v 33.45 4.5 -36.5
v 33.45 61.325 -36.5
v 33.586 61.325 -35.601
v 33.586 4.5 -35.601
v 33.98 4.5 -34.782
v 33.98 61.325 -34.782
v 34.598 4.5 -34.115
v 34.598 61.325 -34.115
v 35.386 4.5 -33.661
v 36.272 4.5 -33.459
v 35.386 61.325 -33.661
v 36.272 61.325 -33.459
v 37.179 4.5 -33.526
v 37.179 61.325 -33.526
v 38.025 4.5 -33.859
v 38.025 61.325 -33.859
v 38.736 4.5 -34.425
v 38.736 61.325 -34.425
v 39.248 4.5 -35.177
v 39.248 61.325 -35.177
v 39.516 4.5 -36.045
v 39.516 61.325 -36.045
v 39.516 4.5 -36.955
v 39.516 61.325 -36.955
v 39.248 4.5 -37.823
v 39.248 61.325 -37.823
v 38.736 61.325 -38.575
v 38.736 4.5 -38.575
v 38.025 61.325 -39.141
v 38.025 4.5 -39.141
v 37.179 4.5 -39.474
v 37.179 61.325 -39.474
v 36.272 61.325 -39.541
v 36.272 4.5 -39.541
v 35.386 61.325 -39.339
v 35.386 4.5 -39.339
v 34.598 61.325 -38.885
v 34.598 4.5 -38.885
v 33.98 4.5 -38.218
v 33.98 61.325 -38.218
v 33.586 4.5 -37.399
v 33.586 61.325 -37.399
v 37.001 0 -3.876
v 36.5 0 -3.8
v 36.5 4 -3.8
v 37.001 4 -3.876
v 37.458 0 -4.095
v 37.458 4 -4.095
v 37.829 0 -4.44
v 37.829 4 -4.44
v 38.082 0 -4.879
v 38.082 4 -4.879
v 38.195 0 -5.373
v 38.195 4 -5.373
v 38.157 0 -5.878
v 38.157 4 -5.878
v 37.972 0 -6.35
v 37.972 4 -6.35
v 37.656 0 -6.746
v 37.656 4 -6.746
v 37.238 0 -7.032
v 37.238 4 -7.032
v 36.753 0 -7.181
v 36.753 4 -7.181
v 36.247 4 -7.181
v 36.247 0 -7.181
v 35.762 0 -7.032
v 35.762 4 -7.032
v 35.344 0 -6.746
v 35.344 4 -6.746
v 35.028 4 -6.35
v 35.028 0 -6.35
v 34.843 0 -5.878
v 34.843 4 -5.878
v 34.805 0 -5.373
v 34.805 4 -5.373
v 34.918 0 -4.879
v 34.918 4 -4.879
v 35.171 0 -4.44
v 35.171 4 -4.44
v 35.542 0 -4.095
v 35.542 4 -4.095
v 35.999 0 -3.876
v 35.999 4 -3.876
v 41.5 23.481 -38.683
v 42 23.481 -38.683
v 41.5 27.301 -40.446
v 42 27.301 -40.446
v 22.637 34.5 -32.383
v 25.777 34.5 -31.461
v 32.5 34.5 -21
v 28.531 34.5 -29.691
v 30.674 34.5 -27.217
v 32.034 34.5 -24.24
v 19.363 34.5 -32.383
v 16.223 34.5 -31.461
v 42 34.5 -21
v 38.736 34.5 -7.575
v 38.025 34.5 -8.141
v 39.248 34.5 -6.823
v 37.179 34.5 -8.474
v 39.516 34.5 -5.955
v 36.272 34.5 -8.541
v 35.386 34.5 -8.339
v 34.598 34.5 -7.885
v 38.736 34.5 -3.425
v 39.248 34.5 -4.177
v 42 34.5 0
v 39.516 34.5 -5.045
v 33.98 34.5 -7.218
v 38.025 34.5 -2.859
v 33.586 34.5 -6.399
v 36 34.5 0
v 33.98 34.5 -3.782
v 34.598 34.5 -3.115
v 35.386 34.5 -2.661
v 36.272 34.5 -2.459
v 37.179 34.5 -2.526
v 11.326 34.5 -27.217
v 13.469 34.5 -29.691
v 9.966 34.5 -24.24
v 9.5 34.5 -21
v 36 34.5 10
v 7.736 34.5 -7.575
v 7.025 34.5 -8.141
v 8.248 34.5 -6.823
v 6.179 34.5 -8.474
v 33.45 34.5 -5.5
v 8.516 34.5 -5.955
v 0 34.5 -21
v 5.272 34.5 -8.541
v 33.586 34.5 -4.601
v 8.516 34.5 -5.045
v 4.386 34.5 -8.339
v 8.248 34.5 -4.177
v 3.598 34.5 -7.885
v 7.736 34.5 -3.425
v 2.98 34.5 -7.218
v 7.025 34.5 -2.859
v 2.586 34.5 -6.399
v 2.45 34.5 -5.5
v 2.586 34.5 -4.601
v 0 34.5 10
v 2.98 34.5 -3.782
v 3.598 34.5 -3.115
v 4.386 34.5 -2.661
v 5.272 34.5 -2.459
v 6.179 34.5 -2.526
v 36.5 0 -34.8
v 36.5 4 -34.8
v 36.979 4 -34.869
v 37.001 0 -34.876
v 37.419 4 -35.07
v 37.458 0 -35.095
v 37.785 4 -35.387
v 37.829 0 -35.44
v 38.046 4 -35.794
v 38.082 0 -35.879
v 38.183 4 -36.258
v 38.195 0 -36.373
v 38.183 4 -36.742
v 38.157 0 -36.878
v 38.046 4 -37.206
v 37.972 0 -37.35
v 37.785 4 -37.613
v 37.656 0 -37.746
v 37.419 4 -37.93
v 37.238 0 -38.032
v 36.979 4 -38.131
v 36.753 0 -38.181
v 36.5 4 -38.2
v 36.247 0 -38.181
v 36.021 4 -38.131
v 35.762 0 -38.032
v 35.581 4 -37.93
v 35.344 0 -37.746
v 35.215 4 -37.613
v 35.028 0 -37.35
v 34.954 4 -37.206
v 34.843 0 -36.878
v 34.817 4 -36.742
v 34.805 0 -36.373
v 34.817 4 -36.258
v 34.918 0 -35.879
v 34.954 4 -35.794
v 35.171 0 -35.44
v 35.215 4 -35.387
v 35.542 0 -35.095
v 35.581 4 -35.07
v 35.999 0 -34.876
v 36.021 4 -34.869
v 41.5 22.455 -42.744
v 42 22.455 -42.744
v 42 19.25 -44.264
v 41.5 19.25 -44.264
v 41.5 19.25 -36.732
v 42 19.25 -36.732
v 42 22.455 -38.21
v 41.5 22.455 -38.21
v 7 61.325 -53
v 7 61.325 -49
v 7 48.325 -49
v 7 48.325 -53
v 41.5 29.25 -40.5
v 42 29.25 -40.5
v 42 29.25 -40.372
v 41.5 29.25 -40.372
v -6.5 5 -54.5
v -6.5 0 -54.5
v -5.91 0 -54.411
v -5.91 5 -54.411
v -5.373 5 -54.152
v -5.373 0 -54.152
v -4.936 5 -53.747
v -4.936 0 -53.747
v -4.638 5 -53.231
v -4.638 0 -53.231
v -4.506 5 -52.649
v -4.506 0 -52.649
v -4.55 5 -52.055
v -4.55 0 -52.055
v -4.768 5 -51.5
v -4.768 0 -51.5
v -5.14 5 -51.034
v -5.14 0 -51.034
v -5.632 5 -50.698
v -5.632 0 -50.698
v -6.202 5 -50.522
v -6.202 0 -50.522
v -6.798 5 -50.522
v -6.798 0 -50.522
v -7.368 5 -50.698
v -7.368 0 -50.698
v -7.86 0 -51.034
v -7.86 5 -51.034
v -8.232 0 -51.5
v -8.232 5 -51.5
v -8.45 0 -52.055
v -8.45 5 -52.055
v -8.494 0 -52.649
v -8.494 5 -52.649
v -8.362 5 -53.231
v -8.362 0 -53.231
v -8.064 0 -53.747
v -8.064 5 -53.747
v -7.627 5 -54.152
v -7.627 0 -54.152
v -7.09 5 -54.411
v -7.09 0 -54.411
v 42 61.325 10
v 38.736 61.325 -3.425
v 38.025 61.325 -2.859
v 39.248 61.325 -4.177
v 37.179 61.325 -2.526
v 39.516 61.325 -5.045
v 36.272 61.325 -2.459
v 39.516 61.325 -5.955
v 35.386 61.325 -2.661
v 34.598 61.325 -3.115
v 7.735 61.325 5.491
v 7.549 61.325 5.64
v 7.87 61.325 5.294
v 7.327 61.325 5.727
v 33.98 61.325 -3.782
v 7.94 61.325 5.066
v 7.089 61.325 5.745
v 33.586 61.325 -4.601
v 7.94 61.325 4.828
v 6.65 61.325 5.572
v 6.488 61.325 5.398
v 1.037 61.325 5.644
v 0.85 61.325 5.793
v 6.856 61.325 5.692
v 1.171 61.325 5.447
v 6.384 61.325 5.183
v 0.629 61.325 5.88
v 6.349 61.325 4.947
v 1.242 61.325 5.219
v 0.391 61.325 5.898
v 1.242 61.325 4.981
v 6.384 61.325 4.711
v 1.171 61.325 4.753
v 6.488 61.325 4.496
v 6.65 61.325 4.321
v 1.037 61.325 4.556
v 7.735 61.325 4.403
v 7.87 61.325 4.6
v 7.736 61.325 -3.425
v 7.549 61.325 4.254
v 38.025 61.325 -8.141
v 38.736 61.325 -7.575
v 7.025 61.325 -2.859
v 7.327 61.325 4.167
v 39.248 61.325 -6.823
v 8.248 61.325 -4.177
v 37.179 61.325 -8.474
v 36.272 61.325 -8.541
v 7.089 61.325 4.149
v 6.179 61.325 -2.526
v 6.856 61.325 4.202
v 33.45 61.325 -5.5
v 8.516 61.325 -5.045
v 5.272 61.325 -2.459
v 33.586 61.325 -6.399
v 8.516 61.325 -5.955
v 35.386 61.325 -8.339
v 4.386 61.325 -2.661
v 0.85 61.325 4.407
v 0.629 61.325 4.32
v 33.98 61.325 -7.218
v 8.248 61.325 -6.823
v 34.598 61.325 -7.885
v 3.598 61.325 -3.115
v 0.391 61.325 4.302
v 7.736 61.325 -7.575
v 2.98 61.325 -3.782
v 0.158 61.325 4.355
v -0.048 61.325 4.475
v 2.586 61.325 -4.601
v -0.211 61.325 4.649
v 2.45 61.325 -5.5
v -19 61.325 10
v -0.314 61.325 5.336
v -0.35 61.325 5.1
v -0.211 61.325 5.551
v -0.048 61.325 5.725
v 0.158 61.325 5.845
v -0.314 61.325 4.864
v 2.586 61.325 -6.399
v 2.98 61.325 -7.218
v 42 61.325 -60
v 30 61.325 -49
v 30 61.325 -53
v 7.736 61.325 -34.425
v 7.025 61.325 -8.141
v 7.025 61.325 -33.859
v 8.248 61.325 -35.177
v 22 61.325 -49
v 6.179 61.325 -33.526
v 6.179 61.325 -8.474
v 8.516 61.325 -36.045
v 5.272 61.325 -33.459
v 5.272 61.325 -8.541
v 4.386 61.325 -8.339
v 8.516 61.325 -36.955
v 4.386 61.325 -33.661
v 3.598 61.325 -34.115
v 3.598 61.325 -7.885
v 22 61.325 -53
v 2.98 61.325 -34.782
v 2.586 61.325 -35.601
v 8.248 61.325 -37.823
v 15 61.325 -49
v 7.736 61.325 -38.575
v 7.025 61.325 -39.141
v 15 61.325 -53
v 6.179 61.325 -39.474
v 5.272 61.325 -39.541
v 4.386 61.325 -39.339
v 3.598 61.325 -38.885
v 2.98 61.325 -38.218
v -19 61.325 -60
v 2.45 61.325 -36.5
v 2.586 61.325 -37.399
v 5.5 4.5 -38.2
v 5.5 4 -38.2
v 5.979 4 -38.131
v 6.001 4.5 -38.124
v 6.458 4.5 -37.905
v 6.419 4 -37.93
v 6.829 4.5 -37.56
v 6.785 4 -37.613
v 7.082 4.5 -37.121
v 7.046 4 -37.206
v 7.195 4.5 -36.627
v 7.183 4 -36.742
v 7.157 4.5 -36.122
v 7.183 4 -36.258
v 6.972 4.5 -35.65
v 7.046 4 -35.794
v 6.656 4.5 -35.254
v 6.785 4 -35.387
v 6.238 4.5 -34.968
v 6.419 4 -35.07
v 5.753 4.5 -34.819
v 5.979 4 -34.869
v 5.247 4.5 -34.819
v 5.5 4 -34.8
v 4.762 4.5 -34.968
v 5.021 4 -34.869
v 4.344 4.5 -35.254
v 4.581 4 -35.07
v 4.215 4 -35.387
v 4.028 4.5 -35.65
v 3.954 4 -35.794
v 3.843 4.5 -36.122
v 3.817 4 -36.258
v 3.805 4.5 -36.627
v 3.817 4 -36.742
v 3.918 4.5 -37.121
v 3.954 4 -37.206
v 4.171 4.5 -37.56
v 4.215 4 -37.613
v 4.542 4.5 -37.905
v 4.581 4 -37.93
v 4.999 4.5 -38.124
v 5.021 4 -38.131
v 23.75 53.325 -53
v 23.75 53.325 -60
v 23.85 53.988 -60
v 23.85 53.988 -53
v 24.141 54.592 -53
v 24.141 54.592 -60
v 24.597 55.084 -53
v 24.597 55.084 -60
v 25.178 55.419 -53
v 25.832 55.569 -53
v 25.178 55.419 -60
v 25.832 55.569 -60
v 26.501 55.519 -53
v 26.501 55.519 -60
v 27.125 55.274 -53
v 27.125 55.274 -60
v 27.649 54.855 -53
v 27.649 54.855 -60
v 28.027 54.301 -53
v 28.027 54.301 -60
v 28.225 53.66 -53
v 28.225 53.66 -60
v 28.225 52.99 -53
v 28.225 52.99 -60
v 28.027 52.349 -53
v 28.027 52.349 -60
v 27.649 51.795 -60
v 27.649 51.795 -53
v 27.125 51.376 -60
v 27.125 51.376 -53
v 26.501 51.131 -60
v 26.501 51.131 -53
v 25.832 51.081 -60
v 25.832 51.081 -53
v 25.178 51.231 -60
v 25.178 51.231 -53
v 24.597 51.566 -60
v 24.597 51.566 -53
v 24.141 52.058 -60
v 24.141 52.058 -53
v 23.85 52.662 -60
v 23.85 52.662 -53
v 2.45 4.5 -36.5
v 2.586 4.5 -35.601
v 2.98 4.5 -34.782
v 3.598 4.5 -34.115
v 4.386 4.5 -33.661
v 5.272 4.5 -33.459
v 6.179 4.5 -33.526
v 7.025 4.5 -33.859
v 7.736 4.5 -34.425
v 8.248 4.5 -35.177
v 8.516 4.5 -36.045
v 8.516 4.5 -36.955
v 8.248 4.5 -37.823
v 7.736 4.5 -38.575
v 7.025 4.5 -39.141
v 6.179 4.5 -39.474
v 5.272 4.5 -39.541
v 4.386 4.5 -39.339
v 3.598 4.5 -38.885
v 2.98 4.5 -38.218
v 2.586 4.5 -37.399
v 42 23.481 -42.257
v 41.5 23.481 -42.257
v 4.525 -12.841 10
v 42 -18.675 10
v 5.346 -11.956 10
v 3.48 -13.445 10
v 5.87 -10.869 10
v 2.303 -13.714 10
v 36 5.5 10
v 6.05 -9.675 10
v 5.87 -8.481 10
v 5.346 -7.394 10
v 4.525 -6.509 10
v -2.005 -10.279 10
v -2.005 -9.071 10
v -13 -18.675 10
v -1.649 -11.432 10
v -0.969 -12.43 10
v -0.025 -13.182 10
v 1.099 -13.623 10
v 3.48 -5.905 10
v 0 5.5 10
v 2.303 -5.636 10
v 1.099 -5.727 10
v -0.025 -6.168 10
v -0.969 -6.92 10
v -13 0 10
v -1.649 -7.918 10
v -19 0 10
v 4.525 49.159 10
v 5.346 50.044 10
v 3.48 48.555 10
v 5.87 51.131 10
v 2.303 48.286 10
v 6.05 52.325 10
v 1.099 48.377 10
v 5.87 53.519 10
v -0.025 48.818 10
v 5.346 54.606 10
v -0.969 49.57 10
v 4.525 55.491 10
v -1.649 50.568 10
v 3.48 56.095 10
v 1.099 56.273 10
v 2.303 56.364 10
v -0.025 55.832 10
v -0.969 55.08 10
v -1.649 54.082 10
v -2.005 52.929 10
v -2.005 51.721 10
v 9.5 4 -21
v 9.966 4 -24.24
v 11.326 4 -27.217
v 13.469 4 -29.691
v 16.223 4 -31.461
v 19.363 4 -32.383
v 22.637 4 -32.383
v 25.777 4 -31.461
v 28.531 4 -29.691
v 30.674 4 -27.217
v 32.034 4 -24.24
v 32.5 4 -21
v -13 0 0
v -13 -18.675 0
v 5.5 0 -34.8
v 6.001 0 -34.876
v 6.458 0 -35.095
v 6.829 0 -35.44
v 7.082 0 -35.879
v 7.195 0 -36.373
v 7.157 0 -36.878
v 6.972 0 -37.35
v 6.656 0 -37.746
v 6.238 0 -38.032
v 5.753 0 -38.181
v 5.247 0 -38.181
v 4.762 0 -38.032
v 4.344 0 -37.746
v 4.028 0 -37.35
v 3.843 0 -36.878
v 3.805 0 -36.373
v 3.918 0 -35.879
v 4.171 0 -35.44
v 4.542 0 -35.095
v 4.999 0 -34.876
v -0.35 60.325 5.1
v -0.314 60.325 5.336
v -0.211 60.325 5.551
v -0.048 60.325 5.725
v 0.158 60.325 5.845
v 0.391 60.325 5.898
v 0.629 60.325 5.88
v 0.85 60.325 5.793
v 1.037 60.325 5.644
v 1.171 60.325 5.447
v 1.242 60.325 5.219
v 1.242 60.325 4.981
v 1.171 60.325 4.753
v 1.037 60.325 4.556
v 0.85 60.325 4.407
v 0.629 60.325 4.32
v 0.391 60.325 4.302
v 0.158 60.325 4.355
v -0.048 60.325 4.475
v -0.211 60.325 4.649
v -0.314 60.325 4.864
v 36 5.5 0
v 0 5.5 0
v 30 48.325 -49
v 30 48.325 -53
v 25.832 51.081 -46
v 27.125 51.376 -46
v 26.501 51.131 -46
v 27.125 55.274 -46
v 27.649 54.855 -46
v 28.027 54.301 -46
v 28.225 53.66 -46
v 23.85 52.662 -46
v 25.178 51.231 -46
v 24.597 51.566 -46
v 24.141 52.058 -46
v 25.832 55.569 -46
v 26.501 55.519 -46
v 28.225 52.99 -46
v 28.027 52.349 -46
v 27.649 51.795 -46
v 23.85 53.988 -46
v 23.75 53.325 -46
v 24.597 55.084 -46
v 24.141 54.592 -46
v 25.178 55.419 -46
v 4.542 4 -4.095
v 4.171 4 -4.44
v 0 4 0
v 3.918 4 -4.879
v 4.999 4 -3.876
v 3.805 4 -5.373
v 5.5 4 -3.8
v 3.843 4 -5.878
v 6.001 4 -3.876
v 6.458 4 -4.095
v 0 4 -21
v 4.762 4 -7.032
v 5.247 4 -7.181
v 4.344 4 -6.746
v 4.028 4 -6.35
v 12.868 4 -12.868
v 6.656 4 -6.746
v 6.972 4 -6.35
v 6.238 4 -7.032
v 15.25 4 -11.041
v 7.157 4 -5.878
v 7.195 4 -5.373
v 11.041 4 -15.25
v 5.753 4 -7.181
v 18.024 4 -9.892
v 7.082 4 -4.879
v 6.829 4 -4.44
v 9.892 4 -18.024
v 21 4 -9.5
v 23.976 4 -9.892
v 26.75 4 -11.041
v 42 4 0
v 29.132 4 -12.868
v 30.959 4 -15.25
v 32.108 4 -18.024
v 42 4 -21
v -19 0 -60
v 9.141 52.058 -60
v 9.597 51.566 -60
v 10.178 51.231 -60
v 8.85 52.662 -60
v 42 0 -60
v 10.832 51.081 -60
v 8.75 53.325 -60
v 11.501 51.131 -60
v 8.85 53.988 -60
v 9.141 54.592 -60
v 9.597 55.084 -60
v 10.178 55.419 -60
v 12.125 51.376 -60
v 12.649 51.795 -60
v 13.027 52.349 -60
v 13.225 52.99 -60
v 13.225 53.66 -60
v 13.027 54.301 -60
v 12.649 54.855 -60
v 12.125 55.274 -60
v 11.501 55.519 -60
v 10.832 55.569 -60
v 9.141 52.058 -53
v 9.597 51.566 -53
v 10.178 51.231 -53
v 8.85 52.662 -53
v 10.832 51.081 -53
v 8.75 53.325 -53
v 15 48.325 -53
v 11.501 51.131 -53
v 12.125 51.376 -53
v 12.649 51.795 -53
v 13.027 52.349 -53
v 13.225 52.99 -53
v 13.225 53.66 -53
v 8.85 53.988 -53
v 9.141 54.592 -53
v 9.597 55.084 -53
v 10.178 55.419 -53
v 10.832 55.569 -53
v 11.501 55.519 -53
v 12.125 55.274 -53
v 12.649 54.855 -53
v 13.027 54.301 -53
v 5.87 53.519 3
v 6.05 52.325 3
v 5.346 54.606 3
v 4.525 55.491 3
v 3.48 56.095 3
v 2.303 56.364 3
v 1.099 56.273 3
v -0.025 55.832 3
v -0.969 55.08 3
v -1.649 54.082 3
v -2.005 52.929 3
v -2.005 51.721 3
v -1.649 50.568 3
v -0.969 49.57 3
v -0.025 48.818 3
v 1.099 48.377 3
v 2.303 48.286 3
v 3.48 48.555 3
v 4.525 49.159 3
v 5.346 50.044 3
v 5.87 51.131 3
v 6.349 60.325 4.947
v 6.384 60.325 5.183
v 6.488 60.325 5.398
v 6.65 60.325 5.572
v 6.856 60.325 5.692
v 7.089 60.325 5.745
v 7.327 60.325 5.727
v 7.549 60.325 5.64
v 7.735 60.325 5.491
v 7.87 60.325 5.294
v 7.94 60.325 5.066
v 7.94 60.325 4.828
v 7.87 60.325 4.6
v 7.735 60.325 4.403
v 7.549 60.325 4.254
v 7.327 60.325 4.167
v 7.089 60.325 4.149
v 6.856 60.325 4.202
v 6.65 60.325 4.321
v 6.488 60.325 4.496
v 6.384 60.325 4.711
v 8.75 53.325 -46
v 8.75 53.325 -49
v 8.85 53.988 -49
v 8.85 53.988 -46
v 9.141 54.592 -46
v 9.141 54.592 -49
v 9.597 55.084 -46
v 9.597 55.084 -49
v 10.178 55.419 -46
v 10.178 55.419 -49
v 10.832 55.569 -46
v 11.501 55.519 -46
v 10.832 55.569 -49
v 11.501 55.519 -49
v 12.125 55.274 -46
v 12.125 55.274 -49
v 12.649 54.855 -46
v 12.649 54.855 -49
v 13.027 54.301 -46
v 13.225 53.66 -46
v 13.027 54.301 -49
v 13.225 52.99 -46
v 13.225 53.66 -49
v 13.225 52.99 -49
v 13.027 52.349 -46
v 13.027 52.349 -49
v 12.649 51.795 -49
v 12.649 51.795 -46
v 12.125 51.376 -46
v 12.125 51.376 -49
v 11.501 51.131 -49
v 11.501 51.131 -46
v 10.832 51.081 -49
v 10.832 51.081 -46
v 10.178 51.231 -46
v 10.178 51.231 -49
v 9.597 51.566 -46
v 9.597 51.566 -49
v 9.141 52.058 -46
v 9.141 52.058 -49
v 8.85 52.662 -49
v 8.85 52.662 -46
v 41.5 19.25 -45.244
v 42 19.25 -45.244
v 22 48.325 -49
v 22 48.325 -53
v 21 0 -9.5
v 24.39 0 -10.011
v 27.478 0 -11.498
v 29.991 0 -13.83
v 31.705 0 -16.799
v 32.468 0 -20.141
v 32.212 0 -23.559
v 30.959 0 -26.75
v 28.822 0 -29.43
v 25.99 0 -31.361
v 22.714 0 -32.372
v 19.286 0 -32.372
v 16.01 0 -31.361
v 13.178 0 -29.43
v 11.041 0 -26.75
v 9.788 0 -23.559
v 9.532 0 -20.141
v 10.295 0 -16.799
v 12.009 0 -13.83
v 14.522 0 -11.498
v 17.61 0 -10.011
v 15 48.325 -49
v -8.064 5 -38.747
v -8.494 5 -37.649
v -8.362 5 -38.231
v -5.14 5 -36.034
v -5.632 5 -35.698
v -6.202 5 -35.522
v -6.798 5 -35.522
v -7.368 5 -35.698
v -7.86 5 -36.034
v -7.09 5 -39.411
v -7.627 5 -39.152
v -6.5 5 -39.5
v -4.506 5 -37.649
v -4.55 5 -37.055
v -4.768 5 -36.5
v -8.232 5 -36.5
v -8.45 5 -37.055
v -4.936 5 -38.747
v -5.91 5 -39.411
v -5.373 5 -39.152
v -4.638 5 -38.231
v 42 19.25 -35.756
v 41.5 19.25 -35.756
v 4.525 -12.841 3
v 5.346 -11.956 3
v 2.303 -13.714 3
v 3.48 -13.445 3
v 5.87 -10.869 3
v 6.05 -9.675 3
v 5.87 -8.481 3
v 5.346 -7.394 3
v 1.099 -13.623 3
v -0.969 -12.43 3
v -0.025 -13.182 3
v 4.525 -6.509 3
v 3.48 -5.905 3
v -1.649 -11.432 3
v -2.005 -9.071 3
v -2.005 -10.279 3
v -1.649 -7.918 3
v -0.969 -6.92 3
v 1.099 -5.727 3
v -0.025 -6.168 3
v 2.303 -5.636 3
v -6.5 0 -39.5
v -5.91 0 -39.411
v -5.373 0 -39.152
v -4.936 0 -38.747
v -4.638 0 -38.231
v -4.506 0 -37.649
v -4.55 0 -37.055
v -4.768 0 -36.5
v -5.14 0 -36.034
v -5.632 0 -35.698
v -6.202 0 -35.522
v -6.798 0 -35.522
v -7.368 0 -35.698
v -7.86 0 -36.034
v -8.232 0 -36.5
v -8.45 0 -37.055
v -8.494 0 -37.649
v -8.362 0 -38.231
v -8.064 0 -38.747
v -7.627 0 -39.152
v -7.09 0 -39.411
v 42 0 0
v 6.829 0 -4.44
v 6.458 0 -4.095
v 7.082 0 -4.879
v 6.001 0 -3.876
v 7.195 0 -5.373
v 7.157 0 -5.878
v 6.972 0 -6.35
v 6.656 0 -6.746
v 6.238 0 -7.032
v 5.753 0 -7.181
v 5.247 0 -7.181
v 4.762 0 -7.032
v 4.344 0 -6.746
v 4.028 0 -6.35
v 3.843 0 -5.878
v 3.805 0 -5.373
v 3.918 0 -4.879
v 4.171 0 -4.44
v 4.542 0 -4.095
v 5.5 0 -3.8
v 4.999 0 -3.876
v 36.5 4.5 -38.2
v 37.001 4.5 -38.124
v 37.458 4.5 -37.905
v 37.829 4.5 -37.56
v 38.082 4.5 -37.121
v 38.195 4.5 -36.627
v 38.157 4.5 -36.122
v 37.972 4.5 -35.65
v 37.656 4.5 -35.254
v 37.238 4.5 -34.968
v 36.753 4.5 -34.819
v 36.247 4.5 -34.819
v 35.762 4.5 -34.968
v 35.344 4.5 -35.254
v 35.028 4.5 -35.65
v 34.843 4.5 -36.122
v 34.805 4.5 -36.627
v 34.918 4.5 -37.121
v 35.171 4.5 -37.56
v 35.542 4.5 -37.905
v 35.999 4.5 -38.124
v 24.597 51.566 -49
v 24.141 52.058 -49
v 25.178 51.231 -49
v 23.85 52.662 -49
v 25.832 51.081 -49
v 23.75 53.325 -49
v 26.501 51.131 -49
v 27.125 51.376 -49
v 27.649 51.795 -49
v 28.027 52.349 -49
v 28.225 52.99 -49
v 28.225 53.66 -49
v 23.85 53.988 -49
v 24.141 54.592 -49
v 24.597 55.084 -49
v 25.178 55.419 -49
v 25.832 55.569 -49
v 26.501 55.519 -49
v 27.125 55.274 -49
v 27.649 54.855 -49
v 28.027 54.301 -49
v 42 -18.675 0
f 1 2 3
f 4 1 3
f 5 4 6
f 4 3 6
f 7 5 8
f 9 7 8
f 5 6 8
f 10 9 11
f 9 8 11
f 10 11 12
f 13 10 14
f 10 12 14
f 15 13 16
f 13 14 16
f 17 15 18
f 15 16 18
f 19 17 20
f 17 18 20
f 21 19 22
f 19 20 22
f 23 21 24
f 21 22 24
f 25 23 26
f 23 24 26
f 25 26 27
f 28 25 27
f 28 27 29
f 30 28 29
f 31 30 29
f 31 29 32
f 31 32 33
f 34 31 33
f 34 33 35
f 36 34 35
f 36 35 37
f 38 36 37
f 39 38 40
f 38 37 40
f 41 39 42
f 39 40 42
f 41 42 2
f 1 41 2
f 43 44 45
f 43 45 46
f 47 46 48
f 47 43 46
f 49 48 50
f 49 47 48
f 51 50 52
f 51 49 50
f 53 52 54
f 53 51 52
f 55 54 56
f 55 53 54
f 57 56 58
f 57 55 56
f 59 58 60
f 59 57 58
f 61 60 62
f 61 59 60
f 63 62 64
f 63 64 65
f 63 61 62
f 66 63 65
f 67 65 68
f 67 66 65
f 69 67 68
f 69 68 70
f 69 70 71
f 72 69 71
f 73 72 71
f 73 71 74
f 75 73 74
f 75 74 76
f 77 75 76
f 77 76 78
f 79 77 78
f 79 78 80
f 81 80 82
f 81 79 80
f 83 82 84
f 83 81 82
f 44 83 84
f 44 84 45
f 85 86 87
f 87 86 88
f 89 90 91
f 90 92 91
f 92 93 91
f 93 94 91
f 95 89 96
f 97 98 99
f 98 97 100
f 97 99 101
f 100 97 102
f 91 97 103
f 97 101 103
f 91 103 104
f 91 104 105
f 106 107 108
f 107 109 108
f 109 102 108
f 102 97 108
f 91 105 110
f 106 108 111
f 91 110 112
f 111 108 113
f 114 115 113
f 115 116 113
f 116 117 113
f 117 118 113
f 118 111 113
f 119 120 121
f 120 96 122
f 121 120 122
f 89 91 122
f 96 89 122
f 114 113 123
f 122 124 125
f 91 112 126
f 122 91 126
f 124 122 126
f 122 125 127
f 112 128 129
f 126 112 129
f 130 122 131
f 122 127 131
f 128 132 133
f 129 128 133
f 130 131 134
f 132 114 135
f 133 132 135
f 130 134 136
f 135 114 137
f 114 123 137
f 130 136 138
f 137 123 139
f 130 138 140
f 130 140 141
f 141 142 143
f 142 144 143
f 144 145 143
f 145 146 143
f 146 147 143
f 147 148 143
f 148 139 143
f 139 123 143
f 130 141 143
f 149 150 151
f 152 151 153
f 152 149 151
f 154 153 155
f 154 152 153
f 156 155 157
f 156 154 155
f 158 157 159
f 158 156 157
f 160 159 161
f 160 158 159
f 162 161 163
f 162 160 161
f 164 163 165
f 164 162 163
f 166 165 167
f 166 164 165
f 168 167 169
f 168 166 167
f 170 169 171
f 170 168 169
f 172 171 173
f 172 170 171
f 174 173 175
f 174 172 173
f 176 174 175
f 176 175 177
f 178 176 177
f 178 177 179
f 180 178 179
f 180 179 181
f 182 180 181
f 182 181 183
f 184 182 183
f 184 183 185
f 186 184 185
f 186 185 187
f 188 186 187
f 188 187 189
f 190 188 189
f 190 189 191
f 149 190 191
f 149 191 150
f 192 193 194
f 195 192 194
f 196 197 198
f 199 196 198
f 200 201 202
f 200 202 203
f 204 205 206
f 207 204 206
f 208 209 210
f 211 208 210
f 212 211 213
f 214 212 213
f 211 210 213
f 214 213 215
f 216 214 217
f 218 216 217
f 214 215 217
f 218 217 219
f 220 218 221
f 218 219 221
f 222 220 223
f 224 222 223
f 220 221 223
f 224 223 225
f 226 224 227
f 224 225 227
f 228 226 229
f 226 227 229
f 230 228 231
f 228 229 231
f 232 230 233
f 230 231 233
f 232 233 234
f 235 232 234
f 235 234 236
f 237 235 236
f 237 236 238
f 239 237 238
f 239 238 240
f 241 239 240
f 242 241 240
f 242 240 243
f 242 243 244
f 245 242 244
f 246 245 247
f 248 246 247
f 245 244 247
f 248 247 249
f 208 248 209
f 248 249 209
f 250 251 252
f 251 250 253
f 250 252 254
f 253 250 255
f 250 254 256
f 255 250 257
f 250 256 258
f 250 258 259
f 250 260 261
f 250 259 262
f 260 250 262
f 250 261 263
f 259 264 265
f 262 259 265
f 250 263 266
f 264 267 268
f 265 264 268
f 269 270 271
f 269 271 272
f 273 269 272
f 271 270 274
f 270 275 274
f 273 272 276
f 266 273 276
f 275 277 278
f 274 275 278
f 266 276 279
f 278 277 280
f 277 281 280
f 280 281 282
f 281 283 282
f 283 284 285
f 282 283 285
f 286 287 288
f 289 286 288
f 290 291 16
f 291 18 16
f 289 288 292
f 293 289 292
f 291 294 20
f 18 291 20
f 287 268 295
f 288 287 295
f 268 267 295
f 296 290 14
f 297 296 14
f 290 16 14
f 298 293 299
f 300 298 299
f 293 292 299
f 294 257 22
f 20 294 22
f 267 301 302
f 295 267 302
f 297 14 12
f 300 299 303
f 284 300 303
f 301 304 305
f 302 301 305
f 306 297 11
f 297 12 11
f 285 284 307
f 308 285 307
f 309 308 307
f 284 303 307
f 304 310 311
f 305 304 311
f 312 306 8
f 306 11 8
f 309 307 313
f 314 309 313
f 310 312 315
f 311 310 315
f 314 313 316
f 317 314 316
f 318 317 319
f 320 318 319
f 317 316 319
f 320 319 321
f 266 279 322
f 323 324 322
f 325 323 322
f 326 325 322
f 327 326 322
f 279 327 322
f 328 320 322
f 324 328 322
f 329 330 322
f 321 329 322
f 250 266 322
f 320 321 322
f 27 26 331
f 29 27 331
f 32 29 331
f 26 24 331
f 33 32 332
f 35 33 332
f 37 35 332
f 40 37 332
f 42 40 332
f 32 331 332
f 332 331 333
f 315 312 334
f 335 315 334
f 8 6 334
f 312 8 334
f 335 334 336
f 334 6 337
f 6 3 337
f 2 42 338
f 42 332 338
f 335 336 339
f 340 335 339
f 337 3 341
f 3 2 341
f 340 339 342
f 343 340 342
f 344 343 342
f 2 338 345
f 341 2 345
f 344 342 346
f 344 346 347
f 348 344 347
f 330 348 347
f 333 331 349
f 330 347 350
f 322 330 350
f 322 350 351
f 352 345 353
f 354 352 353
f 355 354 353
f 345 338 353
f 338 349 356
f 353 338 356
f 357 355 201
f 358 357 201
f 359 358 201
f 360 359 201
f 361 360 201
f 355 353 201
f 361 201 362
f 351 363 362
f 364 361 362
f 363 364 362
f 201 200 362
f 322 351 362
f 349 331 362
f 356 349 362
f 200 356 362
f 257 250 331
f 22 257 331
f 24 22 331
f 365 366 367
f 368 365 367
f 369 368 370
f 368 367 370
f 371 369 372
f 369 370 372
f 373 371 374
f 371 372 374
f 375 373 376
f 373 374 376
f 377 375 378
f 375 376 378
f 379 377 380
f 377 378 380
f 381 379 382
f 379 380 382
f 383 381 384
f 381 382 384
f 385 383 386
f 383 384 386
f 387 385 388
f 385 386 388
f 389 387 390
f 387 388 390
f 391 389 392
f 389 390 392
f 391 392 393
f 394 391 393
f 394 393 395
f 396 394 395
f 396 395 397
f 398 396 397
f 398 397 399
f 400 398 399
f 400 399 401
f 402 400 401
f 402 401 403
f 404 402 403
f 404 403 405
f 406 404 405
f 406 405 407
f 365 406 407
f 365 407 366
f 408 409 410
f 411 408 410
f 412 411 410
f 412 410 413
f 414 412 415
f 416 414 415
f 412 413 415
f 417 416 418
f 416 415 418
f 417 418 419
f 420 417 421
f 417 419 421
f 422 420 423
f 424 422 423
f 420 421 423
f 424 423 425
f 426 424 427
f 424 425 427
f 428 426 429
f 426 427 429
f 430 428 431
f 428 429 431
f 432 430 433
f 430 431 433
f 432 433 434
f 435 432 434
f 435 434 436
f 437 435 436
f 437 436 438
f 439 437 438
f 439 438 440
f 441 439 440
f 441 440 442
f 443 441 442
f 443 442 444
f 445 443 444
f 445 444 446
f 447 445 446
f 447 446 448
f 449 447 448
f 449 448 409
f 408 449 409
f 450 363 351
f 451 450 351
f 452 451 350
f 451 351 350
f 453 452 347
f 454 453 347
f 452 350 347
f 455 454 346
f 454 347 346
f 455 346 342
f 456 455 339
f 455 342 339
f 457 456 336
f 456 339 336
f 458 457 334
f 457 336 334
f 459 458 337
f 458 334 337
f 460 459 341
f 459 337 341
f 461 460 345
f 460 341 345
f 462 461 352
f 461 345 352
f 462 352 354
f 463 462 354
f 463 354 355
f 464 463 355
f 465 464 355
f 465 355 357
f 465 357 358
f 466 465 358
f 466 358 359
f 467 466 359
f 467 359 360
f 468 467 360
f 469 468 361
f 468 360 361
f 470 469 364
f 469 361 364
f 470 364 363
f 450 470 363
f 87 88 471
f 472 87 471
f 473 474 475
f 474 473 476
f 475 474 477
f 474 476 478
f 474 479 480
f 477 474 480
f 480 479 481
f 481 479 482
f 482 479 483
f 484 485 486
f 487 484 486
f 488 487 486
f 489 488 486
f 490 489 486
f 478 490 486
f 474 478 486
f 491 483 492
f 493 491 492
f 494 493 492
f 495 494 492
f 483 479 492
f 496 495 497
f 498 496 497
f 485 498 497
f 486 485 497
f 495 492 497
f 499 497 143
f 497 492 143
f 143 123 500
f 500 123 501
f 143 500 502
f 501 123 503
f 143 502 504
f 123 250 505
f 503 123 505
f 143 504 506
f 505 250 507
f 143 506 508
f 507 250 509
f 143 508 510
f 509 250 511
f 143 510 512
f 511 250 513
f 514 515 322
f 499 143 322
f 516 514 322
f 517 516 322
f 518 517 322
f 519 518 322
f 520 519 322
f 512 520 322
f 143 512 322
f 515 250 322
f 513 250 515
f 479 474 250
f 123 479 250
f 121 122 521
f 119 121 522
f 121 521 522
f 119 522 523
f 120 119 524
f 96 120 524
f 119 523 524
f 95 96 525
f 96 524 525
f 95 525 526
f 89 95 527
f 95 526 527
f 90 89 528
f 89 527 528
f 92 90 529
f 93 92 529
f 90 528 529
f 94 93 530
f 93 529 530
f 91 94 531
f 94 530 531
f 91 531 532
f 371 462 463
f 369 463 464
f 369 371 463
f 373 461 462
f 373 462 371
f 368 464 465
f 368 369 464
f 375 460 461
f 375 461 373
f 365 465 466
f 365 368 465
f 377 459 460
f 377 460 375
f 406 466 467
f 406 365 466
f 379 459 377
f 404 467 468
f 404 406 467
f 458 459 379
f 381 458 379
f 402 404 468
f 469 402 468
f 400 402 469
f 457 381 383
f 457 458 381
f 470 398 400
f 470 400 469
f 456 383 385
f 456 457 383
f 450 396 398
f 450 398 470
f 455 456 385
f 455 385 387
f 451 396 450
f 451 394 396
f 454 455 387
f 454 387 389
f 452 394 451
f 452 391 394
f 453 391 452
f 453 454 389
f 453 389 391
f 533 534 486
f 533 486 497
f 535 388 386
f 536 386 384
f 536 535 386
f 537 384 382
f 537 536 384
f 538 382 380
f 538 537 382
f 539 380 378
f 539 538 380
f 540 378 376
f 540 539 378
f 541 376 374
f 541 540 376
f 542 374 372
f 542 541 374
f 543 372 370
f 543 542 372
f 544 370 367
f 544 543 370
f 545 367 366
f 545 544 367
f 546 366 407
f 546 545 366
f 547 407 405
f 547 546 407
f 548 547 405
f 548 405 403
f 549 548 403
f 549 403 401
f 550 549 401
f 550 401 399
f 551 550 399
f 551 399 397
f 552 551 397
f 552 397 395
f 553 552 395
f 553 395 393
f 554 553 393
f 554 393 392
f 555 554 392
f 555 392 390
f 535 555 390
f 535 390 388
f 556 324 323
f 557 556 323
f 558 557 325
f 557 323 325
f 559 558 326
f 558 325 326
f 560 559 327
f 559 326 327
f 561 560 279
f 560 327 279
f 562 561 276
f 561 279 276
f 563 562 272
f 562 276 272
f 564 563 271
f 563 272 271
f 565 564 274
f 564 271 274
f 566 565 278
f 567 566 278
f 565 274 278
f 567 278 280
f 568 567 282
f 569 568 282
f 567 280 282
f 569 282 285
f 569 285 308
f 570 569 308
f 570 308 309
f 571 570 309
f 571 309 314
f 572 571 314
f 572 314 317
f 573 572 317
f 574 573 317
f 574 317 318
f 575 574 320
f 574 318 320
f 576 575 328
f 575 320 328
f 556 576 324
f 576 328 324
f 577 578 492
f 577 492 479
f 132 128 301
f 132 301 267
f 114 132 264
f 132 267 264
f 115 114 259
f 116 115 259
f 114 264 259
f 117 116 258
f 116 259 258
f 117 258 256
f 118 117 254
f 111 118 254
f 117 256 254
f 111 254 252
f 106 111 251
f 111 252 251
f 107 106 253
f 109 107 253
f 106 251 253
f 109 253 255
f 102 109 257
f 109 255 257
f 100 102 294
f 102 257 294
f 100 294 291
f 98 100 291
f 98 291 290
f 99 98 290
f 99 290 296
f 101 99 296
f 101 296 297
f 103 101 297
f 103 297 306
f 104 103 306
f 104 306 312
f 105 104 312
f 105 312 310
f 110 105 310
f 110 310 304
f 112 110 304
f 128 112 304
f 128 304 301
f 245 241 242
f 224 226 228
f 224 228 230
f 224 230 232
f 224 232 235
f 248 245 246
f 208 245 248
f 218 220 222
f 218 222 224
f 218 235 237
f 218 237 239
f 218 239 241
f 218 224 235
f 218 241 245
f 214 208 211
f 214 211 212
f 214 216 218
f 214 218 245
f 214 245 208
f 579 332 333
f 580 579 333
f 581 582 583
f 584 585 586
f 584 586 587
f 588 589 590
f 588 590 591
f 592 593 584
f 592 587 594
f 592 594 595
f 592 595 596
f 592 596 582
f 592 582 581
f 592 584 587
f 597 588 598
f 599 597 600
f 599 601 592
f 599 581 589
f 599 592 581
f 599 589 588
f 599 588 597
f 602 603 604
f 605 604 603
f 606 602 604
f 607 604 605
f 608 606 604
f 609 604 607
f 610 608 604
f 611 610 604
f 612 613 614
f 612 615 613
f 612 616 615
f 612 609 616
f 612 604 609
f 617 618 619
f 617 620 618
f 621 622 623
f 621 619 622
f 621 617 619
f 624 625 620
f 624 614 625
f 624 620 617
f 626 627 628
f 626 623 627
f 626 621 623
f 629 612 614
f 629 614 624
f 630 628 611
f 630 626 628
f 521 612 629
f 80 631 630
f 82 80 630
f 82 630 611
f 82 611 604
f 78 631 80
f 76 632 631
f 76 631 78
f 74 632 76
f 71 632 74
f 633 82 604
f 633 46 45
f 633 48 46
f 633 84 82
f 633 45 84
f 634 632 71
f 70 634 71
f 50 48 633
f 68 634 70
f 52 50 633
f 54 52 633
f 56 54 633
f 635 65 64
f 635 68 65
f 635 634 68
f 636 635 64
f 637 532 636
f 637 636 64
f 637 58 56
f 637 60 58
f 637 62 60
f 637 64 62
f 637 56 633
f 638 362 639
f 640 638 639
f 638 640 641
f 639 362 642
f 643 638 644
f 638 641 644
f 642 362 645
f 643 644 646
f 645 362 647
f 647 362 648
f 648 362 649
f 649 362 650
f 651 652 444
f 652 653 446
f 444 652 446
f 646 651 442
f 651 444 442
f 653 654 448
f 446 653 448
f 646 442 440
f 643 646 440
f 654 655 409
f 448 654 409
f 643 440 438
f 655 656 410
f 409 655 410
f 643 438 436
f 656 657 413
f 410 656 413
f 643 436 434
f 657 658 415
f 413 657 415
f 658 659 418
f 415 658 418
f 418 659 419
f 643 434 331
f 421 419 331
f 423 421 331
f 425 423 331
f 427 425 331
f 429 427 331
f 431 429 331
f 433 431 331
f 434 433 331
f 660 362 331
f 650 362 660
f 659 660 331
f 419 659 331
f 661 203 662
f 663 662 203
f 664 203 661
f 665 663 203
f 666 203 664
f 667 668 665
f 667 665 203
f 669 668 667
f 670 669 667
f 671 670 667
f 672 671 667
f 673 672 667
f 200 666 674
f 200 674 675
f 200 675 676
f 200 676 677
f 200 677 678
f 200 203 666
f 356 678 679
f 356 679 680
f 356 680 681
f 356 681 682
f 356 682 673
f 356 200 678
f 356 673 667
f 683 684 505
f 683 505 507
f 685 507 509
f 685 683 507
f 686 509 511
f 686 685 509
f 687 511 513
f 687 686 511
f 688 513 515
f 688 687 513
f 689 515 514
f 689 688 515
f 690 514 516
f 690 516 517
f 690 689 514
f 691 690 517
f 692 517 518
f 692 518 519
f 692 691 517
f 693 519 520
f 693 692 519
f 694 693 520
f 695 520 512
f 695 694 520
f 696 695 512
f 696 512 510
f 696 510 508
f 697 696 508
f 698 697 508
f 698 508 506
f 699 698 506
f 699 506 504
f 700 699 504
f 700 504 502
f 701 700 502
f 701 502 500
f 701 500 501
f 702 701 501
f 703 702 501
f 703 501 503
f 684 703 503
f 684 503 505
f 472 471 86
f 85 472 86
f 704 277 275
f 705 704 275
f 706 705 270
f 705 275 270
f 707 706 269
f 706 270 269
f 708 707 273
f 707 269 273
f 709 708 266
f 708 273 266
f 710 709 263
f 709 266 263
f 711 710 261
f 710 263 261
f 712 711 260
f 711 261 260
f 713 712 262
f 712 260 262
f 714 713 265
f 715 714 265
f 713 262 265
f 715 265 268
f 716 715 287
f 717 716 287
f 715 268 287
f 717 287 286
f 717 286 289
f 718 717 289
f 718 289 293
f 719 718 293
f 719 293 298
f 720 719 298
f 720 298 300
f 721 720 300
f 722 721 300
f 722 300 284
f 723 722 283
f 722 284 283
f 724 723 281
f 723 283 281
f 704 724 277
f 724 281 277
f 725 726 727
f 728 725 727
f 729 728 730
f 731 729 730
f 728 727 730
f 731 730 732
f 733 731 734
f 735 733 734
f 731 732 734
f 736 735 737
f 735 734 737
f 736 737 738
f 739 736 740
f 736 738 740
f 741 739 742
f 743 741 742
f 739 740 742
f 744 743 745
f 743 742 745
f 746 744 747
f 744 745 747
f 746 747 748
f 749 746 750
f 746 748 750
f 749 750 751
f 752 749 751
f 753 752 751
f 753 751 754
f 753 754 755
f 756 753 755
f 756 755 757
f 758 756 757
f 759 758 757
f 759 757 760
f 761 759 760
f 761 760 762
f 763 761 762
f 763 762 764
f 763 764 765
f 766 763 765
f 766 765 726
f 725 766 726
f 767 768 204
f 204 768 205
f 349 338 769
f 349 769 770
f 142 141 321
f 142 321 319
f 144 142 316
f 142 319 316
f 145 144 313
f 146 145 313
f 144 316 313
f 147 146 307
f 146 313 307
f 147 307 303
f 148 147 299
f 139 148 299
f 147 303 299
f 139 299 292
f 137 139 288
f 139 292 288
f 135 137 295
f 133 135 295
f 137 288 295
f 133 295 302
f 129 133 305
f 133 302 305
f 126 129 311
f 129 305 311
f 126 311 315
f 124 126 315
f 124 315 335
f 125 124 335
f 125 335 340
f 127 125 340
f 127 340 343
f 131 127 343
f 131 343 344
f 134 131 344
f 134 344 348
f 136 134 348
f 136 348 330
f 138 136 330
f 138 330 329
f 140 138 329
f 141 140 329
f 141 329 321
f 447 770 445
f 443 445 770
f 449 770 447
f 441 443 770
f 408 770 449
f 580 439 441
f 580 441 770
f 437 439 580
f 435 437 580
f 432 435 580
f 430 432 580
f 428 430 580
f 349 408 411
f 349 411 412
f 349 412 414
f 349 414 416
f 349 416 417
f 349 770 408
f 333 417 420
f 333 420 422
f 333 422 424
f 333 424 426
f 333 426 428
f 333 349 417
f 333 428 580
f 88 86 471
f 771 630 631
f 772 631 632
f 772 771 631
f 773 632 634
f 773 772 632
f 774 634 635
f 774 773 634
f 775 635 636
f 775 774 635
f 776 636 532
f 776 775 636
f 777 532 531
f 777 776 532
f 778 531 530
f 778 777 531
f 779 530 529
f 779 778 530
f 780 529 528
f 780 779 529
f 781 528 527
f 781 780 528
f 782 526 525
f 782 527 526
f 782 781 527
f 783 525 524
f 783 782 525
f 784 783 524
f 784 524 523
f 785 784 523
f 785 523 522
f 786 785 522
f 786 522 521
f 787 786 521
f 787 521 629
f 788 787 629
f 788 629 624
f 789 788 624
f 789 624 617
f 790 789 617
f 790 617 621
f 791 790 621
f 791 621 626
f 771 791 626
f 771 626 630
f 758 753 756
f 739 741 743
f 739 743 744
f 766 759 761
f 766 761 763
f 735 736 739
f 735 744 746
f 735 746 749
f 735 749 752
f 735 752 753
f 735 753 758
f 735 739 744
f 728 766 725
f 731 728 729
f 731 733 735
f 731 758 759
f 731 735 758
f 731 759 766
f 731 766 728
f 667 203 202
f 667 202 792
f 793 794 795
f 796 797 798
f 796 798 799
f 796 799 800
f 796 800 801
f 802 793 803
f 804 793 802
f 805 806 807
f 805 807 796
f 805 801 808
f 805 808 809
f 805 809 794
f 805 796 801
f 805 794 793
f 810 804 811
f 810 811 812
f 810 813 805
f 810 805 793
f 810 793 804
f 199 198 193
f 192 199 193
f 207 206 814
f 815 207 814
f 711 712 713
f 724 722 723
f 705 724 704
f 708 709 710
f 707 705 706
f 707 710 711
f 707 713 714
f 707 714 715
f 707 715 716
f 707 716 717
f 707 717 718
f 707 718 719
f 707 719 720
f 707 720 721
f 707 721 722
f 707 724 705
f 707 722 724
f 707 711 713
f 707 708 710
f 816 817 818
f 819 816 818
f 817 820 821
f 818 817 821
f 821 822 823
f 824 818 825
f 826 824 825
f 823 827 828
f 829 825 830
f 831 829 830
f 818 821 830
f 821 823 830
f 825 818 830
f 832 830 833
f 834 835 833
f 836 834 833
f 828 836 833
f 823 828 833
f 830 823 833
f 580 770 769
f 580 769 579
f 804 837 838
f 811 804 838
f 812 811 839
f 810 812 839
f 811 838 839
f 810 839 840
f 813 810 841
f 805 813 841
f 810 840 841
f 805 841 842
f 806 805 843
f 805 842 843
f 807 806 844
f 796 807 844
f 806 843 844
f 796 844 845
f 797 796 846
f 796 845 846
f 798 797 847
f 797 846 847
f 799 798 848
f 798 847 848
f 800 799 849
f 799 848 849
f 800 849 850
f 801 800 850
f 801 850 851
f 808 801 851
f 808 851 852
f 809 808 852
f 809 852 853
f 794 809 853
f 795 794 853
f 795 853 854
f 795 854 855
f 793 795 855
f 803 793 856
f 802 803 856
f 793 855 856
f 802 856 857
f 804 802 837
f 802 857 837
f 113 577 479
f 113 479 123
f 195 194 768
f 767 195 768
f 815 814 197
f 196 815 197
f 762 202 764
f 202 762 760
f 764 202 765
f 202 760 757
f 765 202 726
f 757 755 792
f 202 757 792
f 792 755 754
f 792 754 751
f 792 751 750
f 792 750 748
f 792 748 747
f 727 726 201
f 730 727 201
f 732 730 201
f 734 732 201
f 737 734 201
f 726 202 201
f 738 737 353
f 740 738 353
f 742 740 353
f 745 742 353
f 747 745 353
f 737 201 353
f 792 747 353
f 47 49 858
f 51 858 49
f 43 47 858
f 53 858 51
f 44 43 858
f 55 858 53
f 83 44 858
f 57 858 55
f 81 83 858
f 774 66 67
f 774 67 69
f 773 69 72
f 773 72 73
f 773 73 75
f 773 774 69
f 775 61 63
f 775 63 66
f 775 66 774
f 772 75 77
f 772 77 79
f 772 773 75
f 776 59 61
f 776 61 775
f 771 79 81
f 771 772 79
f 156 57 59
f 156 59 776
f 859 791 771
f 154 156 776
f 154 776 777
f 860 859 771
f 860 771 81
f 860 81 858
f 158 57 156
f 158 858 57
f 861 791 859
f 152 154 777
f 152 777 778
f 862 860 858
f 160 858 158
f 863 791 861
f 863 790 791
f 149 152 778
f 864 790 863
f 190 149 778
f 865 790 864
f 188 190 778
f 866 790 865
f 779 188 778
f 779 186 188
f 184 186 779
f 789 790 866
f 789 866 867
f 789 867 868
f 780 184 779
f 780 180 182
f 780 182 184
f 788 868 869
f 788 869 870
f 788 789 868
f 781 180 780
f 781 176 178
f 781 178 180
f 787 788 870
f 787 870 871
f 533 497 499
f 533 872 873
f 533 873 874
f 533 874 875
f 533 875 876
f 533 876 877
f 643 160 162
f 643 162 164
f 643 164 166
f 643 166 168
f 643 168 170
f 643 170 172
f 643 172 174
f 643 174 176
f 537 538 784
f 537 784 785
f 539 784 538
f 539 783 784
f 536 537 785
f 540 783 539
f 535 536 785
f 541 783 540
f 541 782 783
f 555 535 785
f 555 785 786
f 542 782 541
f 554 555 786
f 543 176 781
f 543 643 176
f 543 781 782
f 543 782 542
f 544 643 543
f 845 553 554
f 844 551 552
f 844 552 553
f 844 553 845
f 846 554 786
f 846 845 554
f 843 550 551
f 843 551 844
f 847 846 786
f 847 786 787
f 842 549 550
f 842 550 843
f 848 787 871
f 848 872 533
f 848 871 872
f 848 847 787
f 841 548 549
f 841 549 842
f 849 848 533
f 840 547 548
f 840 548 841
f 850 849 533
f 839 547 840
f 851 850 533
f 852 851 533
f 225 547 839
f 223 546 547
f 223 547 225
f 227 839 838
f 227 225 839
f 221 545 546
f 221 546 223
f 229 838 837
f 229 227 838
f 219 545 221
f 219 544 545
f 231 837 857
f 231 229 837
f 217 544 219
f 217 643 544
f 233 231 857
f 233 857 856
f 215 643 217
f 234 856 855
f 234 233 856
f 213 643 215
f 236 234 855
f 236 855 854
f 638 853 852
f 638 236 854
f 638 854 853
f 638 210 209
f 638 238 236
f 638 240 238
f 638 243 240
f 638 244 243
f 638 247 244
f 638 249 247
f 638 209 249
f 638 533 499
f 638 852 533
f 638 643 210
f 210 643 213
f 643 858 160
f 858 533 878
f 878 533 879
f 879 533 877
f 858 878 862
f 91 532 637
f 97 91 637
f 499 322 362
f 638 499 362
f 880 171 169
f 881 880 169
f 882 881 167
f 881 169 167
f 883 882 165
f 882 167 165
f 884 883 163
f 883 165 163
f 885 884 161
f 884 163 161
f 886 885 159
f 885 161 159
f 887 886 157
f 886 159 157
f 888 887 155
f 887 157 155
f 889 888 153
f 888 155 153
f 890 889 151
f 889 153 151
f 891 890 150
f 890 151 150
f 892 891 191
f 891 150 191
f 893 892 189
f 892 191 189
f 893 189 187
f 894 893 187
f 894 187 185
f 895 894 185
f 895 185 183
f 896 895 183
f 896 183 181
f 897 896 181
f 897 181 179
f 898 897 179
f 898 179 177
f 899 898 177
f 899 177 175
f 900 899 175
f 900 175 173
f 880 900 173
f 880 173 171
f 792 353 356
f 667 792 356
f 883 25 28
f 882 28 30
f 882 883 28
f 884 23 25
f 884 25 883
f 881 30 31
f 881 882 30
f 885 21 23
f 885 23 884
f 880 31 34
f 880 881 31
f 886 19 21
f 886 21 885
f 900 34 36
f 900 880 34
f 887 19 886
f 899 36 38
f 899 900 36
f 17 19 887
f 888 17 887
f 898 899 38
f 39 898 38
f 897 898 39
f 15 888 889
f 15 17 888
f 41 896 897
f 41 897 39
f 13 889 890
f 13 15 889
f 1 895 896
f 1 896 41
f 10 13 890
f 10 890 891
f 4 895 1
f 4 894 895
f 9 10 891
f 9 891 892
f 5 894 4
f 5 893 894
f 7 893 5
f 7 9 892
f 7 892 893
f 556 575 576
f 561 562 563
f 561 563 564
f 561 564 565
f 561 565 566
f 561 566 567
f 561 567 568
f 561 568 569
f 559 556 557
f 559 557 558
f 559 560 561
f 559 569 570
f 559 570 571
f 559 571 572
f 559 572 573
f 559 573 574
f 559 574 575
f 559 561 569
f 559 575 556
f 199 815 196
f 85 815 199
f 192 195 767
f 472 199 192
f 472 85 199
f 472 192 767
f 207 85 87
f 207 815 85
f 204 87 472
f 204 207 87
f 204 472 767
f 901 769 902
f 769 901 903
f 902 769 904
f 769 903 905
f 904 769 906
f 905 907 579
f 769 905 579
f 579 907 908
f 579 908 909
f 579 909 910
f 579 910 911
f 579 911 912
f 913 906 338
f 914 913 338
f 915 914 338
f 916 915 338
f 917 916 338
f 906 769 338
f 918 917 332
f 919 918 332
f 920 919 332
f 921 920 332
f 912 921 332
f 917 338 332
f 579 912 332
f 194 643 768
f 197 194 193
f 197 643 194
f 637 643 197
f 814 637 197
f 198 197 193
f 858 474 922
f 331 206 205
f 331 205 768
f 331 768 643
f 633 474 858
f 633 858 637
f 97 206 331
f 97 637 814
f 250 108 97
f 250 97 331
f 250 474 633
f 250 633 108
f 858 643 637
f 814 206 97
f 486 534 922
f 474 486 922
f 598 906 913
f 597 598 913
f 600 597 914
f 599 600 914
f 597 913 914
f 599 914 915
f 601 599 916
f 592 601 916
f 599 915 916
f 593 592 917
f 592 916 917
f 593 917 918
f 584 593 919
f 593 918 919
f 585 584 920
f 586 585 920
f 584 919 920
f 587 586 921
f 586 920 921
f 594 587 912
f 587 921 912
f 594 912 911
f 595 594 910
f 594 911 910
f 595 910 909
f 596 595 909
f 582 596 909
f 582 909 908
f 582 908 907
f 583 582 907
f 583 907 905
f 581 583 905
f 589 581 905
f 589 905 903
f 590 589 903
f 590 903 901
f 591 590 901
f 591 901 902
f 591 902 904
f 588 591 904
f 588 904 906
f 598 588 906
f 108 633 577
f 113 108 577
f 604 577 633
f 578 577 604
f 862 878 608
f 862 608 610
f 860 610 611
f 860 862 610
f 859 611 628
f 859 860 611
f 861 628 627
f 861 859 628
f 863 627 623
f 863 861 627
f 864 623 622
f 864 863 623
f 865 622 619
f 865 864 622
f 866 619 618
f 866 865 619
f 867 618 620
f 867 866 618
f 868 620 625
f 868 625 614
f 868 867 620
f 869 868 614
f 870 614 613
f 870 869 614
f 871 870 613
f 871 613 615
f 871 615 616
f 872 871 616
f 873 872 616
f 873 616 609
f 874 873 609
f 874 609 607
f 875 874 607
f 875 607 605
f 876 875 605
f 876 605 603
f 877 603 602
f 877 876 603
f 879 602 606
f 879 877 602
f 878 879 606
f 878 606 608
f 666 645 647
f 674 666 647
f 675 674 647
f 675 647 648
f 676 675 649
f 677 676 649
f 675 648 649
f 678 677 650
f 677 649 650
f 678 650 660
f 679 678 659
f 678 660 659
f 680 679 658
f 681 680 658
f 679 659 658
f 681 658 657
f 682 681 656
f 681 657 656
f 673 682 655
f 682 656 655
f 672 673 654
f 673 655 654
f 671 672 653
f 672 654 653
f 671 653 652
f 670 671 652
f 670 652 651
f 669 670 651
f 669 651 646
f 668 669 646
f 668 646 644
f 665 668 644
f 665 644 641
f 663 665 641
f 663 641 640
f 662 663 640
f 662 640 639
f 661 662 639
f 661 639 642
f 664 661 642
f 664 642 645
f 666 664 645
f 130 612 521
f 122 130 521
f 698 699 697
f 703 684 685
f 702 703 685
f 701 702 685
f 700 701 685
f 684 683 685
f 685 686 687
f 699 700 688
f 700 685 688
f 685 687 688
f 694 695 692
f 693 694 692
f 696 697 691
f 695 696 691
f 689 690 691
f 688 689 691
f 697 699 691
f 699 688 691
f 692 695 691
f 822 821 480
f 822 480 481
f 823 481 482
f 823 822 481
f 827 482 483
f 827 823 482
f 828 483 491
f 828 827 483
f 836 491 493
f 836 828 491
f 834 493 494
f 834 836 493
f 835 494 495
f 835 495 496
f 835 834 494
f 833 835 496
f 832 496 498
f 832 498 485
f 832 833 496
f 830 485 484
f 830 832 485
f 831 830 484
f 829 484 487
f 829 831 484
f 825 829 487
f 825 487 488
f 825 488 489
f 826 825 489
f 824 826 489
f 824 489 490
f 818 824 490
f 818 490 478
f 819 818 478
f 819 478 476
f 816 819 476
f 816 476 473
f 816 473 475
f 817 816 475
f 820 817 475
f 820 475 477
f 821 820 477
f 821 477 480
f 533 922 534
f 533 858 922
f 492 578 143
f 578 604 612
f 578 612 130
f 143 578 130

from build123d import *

# Parameters (mm, degrees)
SKETCH1_W           = 42
SKETCH1_H           = 42
SKETCH1_R           = 1.7
SKETCH1_R_2         = 11.5
BOSS_EXTRUDE1_DEPTH = 4
SKETCH2_W           = 55
SKETCH2_H           = 80
SKETCH2_R           = 4.05
SKETCH2_W_2         = 36
SKETCH2_H_2         = 29
BOSS_EXTRUDE2_DEPTH = 10
BOSS_EXTRUDE4_DEPTH = 30.5
SKETCH5_W           = 42
SKETCH5_H           = 26.825
BOSS_EXTRUDE5_DEPTH = 42
SKETCH6_R           = 1.7
CUT_EXTRUDE1_DEPTH  = 83.547898974
SKETCH7_R           = 3.05
CUT_EXTRUDE2_DEPTH  = 56.825
SKETCH3_R           = 4.05
BOSS_EXTRUDE7_DEPTH = 3
SKETCH8_R           = 0.8
CUT_EXTRUDE3_DEPTH  = 1
BOSS_EXTRUDE8_DEPTH = 61.325
SKETCH10_R          = 2
CUT_EXTRUDE4_DEPTH  = 5
SKETCH11_R          = 2.25
CUT_EXTRUDE5_DEPTH  = 14
SKETCH12_W          = 8
SKETCH12_H          = 4
CUT_EXTRUDE6_DEPTH  = 13
CUT_EXTRUDE7_DEPTH  = 0.5


with BuildPart() as part:
    # Sketch1 → Boss-Extrude1 (new body)
    with BuildSketch(Plane(origin=(0, 0, 0), x_dir=(1, 0, 0), z_dir=(0, 1, 0))):
        with Locations((21, 21)):
            Rectangle(SKETCH1_W, SKETCH1_H)
        with Locations(Location((5.5, 36.5, 0), (0, 0, 270))):
            Circle(SKETCH1_R, mode=Mode.SUBTRACT)
        with Locations(Location((36.5, 36.5, 0), (0, 0, 270))):
            Circle(SKETCH1_R, mode=Mode.SUBTRACT)
        with Locations(Location((5.5, 5.5, 0), (0, 0, 270))):
            Circle(SKETCH1_R, mode=Mode.SUBTRACT)
        with Locations(Location((36.5, 5.5, 0), (0, 0, 270))):
            Circle(SKETCH1_R, mode=Mode.SUBTRACT)
        with Locations(Location((21, 21, 0), (0, 0, 270))):
            Circle(SKETCH1_R_2, mode=Mode.SUBTRACT)
    extrude(amount=BOSS_EXTRUDE1_DEPTH)

    # Sketch2 → Boss-Extrude2 (add)
    with BuildSketch(Plane.XY):
        with Locations((14.5, 21.325)):
            Rectangle(SKETCH2_W, SKETCH2_H)
        with Locations((2, 52.325)):
            Circle(SKETCH2_R, mode=Mode.SUBTRACT)
        with Locations((2, -9.675)):
            Circle(SKETCH2_R, mode=Mode.SUBTRACT)
        with Locations((18, 20)):
            Rectangle(SKETCH2_W_2, SKETCH2_H_2, mode=Mode.SUBTRACT)
    extrude(amount=BOSS_EXTRUDE2_DEPTH)

    # Sketch4 → Boss-Extrude4 (add)
    with BuildSketch(Plane(origin=(0, 4, 0), x_dir=(1, 0, 0), z_dir=(0, 1, 0))):
        with BuildLine():
            Line((0, 21), (9.5, 21))
            ThreePointArc((9.5, 21), (21, 32.5), (32.5, 21))
            Line((32.5, 21), (42, 21))
            Line((42, 21), (42, 42))
            Line((42, 42), (0, 42))
            Line((0, 42), (0, 21))
        make_face()
    extrude(amount=BOSS_EXTRUDE4_DEPTH)

    # Sketch5 → Boss-Extrude5 (add)
    with BuildSketch(Plane(origin=(0, 0, 0), x_dir=(-1, 0, 0), z_dir=(0, 0, -1))):
        with Locations((-21, 47.9125)):
            Rectangle(SKETCH5_W, SKETCH5_H)
    extrude(amount=BOSS_EXTRUDE5_DEPTH)

    # Sketch6 → Cut-Extrude1 (cut, through all)
    with BuildSketch(Plane.XZ.offset(-4)):
        with Locations(Location((5.5, -36.5, 0), (0, 0, 270))):
            Circle(SKETCH6_R)
        with Locations(Location((36.5, -36.5, 0), (0, 0, 270))):
            Circle(SKETCH6_R)
    extrude(amount=-CUT_EXTRUDE1_DEPTH, mode=Mode.SUBTRACT)

    # Sketch7 → Cut-Extrude2 (cut)
    with BuildSketch(Plane(origin=(0, 61.325, 0), x_dir=(1, 0, 0), z_dir=(0, 1, 0))):
        with Locations(Location((5.5, 36.5, 0), (0, 0, 180))):
            Circle(SKETCH7_R)
        with Locations(Location((36.5, 36.5, 0), (0, 0, 180))):
            Circle(SKETCH7_R)
        with Locations(Location((5.5, 5.5, 0), (0, 0, 180))):
            Circle(SKETCH7_R)
        with Locations(Location((36.5, 5.5, 0), (0, 0, 180))):
            Circle(SKETCH7_R)
    extrude(amount=-CUT_EXTRUDE2_DEPTH, mode=Mode.SUBTRACT)

    # Sketch3 → Boss-Extrude7 (add)
    with BuildSketch(Plane(origin=(0, 0, 0), x_dir=(-1, 0, 0), z_dir=(0, 0, -1))):
        with Locations((-2, -9.675)):
            Circle(SKETCH3_R)
        with Locations((-2, 52.325)):
            Circle(SKETCH3_R)
    extrude(amount=-BOSS_EXTRUDE7_DEPTH)

    # Sketch8 → Cut-Extrude3 (cut)
    with BuildSketch(Plane(origin=(0, 61.325, 0), x_dir=(1, 0, 0), z_dir=(0, 1, 0))):
        with Locations(Location((0.450490451, -5.1, 0), (0, 0, 180))):
            Circle(SKETCH8_R)
        with Locations(Location((7.148741473, -4.946920802, 0), (0, 0, 180))):
            Circle(SKETCH8_R)
    extrude(amount=-CUT_EXTRUDE3_DEPTH, mode=Mode.SUBTRACT)

    # Sketch9 → Boss-Extrude8 (add)
    with BuildSketch(Plane(origin=(0, 61.325, 0), x_dir=(1, 0, 0), z_dir=(0, 1, 0))):
        Polygon((-13, -10), (-19, -10), (-19, 60), (42, 60), (42, 42), (0, 42), (0, 0), (-13, 0), align=None)
    extrude(amount=-BOSS_EXTRUDE8_DEPTH)

    # Sketch10 → Cut-Extrude4 (cut)
    with BuildSketch(Plane.XZ):
        with Locations(Location((-6.5, -52.5, 0), (0, 0, 270))):
            Circle(SKETCH10_R)
        with Locations(Location((-6.5, -37.5, 0), (0, 0, 270))):
            Circle(SKETCH10_R)
    extrude(amount=-CUT_EXTRUDE4_DEPTH, mode=Mode.SUBTRACT)

    # Sketch11 → Cut-Extrude5 (cut)
    with BuildSketch(Plane(origin=(0, 0, -60), x_dir=(-1, 0, 0), z_dir=(0, 0, -1))):
        with Locations((-26, 53.325)):
            Circle(SKETCH11_R)
        with Locations((-11, 53.325)):
            Circle(SKETCH11_R)
    extrude(amount=-CUT_EXTRUDE5_DEPTH, mode=Mode.SUBTRACT)

    # Sketch12 → Cut-Extrude6 (cut)
    with BuildSketch(Plane(origin=(0, 61.325, 0), x_dir=(1, 0, 0), z_dir=(0, 1, 0))):
        with Locations((11, 51)):
            Rectangle(SKETCH12_W, SKETCH12_H)
        with Locations((26, 51)):
            Rectangle(SKETCH12_W, SKETCH12_H)
    extrude(amount=-CUT_EXTRUDE6_DEPTH, mode=Mode.SUBTRACT)

    # Sketch13 → Cut-Extrude7 (cut)
    with BuildSketch(Plane(origin=(42, 0, 0), x_dir=(0, 0, -1), z_dir=(1, 0, 0))):
        Polygon((40.371794872, 29.25), (35.756410256, 19.25), (36.731971154, 19.25), (38.210336538, 22.455128205), (42.743589744, 22.455128205), (44.264022436, 19.25), (45.243589744, 19.25), (40.5, 29.25), align=None)
        Polygon((40.445913462, 27.30088141), (42.256810897, 23.480769231), (38.683092949, 23.480769231), align=None, mode=Mode.SUBTRACT)
    extrude(amount=-CUT_EXTRUDE7_DEPTH, mode=Mode.SUBTRACT)


solid = part.part
